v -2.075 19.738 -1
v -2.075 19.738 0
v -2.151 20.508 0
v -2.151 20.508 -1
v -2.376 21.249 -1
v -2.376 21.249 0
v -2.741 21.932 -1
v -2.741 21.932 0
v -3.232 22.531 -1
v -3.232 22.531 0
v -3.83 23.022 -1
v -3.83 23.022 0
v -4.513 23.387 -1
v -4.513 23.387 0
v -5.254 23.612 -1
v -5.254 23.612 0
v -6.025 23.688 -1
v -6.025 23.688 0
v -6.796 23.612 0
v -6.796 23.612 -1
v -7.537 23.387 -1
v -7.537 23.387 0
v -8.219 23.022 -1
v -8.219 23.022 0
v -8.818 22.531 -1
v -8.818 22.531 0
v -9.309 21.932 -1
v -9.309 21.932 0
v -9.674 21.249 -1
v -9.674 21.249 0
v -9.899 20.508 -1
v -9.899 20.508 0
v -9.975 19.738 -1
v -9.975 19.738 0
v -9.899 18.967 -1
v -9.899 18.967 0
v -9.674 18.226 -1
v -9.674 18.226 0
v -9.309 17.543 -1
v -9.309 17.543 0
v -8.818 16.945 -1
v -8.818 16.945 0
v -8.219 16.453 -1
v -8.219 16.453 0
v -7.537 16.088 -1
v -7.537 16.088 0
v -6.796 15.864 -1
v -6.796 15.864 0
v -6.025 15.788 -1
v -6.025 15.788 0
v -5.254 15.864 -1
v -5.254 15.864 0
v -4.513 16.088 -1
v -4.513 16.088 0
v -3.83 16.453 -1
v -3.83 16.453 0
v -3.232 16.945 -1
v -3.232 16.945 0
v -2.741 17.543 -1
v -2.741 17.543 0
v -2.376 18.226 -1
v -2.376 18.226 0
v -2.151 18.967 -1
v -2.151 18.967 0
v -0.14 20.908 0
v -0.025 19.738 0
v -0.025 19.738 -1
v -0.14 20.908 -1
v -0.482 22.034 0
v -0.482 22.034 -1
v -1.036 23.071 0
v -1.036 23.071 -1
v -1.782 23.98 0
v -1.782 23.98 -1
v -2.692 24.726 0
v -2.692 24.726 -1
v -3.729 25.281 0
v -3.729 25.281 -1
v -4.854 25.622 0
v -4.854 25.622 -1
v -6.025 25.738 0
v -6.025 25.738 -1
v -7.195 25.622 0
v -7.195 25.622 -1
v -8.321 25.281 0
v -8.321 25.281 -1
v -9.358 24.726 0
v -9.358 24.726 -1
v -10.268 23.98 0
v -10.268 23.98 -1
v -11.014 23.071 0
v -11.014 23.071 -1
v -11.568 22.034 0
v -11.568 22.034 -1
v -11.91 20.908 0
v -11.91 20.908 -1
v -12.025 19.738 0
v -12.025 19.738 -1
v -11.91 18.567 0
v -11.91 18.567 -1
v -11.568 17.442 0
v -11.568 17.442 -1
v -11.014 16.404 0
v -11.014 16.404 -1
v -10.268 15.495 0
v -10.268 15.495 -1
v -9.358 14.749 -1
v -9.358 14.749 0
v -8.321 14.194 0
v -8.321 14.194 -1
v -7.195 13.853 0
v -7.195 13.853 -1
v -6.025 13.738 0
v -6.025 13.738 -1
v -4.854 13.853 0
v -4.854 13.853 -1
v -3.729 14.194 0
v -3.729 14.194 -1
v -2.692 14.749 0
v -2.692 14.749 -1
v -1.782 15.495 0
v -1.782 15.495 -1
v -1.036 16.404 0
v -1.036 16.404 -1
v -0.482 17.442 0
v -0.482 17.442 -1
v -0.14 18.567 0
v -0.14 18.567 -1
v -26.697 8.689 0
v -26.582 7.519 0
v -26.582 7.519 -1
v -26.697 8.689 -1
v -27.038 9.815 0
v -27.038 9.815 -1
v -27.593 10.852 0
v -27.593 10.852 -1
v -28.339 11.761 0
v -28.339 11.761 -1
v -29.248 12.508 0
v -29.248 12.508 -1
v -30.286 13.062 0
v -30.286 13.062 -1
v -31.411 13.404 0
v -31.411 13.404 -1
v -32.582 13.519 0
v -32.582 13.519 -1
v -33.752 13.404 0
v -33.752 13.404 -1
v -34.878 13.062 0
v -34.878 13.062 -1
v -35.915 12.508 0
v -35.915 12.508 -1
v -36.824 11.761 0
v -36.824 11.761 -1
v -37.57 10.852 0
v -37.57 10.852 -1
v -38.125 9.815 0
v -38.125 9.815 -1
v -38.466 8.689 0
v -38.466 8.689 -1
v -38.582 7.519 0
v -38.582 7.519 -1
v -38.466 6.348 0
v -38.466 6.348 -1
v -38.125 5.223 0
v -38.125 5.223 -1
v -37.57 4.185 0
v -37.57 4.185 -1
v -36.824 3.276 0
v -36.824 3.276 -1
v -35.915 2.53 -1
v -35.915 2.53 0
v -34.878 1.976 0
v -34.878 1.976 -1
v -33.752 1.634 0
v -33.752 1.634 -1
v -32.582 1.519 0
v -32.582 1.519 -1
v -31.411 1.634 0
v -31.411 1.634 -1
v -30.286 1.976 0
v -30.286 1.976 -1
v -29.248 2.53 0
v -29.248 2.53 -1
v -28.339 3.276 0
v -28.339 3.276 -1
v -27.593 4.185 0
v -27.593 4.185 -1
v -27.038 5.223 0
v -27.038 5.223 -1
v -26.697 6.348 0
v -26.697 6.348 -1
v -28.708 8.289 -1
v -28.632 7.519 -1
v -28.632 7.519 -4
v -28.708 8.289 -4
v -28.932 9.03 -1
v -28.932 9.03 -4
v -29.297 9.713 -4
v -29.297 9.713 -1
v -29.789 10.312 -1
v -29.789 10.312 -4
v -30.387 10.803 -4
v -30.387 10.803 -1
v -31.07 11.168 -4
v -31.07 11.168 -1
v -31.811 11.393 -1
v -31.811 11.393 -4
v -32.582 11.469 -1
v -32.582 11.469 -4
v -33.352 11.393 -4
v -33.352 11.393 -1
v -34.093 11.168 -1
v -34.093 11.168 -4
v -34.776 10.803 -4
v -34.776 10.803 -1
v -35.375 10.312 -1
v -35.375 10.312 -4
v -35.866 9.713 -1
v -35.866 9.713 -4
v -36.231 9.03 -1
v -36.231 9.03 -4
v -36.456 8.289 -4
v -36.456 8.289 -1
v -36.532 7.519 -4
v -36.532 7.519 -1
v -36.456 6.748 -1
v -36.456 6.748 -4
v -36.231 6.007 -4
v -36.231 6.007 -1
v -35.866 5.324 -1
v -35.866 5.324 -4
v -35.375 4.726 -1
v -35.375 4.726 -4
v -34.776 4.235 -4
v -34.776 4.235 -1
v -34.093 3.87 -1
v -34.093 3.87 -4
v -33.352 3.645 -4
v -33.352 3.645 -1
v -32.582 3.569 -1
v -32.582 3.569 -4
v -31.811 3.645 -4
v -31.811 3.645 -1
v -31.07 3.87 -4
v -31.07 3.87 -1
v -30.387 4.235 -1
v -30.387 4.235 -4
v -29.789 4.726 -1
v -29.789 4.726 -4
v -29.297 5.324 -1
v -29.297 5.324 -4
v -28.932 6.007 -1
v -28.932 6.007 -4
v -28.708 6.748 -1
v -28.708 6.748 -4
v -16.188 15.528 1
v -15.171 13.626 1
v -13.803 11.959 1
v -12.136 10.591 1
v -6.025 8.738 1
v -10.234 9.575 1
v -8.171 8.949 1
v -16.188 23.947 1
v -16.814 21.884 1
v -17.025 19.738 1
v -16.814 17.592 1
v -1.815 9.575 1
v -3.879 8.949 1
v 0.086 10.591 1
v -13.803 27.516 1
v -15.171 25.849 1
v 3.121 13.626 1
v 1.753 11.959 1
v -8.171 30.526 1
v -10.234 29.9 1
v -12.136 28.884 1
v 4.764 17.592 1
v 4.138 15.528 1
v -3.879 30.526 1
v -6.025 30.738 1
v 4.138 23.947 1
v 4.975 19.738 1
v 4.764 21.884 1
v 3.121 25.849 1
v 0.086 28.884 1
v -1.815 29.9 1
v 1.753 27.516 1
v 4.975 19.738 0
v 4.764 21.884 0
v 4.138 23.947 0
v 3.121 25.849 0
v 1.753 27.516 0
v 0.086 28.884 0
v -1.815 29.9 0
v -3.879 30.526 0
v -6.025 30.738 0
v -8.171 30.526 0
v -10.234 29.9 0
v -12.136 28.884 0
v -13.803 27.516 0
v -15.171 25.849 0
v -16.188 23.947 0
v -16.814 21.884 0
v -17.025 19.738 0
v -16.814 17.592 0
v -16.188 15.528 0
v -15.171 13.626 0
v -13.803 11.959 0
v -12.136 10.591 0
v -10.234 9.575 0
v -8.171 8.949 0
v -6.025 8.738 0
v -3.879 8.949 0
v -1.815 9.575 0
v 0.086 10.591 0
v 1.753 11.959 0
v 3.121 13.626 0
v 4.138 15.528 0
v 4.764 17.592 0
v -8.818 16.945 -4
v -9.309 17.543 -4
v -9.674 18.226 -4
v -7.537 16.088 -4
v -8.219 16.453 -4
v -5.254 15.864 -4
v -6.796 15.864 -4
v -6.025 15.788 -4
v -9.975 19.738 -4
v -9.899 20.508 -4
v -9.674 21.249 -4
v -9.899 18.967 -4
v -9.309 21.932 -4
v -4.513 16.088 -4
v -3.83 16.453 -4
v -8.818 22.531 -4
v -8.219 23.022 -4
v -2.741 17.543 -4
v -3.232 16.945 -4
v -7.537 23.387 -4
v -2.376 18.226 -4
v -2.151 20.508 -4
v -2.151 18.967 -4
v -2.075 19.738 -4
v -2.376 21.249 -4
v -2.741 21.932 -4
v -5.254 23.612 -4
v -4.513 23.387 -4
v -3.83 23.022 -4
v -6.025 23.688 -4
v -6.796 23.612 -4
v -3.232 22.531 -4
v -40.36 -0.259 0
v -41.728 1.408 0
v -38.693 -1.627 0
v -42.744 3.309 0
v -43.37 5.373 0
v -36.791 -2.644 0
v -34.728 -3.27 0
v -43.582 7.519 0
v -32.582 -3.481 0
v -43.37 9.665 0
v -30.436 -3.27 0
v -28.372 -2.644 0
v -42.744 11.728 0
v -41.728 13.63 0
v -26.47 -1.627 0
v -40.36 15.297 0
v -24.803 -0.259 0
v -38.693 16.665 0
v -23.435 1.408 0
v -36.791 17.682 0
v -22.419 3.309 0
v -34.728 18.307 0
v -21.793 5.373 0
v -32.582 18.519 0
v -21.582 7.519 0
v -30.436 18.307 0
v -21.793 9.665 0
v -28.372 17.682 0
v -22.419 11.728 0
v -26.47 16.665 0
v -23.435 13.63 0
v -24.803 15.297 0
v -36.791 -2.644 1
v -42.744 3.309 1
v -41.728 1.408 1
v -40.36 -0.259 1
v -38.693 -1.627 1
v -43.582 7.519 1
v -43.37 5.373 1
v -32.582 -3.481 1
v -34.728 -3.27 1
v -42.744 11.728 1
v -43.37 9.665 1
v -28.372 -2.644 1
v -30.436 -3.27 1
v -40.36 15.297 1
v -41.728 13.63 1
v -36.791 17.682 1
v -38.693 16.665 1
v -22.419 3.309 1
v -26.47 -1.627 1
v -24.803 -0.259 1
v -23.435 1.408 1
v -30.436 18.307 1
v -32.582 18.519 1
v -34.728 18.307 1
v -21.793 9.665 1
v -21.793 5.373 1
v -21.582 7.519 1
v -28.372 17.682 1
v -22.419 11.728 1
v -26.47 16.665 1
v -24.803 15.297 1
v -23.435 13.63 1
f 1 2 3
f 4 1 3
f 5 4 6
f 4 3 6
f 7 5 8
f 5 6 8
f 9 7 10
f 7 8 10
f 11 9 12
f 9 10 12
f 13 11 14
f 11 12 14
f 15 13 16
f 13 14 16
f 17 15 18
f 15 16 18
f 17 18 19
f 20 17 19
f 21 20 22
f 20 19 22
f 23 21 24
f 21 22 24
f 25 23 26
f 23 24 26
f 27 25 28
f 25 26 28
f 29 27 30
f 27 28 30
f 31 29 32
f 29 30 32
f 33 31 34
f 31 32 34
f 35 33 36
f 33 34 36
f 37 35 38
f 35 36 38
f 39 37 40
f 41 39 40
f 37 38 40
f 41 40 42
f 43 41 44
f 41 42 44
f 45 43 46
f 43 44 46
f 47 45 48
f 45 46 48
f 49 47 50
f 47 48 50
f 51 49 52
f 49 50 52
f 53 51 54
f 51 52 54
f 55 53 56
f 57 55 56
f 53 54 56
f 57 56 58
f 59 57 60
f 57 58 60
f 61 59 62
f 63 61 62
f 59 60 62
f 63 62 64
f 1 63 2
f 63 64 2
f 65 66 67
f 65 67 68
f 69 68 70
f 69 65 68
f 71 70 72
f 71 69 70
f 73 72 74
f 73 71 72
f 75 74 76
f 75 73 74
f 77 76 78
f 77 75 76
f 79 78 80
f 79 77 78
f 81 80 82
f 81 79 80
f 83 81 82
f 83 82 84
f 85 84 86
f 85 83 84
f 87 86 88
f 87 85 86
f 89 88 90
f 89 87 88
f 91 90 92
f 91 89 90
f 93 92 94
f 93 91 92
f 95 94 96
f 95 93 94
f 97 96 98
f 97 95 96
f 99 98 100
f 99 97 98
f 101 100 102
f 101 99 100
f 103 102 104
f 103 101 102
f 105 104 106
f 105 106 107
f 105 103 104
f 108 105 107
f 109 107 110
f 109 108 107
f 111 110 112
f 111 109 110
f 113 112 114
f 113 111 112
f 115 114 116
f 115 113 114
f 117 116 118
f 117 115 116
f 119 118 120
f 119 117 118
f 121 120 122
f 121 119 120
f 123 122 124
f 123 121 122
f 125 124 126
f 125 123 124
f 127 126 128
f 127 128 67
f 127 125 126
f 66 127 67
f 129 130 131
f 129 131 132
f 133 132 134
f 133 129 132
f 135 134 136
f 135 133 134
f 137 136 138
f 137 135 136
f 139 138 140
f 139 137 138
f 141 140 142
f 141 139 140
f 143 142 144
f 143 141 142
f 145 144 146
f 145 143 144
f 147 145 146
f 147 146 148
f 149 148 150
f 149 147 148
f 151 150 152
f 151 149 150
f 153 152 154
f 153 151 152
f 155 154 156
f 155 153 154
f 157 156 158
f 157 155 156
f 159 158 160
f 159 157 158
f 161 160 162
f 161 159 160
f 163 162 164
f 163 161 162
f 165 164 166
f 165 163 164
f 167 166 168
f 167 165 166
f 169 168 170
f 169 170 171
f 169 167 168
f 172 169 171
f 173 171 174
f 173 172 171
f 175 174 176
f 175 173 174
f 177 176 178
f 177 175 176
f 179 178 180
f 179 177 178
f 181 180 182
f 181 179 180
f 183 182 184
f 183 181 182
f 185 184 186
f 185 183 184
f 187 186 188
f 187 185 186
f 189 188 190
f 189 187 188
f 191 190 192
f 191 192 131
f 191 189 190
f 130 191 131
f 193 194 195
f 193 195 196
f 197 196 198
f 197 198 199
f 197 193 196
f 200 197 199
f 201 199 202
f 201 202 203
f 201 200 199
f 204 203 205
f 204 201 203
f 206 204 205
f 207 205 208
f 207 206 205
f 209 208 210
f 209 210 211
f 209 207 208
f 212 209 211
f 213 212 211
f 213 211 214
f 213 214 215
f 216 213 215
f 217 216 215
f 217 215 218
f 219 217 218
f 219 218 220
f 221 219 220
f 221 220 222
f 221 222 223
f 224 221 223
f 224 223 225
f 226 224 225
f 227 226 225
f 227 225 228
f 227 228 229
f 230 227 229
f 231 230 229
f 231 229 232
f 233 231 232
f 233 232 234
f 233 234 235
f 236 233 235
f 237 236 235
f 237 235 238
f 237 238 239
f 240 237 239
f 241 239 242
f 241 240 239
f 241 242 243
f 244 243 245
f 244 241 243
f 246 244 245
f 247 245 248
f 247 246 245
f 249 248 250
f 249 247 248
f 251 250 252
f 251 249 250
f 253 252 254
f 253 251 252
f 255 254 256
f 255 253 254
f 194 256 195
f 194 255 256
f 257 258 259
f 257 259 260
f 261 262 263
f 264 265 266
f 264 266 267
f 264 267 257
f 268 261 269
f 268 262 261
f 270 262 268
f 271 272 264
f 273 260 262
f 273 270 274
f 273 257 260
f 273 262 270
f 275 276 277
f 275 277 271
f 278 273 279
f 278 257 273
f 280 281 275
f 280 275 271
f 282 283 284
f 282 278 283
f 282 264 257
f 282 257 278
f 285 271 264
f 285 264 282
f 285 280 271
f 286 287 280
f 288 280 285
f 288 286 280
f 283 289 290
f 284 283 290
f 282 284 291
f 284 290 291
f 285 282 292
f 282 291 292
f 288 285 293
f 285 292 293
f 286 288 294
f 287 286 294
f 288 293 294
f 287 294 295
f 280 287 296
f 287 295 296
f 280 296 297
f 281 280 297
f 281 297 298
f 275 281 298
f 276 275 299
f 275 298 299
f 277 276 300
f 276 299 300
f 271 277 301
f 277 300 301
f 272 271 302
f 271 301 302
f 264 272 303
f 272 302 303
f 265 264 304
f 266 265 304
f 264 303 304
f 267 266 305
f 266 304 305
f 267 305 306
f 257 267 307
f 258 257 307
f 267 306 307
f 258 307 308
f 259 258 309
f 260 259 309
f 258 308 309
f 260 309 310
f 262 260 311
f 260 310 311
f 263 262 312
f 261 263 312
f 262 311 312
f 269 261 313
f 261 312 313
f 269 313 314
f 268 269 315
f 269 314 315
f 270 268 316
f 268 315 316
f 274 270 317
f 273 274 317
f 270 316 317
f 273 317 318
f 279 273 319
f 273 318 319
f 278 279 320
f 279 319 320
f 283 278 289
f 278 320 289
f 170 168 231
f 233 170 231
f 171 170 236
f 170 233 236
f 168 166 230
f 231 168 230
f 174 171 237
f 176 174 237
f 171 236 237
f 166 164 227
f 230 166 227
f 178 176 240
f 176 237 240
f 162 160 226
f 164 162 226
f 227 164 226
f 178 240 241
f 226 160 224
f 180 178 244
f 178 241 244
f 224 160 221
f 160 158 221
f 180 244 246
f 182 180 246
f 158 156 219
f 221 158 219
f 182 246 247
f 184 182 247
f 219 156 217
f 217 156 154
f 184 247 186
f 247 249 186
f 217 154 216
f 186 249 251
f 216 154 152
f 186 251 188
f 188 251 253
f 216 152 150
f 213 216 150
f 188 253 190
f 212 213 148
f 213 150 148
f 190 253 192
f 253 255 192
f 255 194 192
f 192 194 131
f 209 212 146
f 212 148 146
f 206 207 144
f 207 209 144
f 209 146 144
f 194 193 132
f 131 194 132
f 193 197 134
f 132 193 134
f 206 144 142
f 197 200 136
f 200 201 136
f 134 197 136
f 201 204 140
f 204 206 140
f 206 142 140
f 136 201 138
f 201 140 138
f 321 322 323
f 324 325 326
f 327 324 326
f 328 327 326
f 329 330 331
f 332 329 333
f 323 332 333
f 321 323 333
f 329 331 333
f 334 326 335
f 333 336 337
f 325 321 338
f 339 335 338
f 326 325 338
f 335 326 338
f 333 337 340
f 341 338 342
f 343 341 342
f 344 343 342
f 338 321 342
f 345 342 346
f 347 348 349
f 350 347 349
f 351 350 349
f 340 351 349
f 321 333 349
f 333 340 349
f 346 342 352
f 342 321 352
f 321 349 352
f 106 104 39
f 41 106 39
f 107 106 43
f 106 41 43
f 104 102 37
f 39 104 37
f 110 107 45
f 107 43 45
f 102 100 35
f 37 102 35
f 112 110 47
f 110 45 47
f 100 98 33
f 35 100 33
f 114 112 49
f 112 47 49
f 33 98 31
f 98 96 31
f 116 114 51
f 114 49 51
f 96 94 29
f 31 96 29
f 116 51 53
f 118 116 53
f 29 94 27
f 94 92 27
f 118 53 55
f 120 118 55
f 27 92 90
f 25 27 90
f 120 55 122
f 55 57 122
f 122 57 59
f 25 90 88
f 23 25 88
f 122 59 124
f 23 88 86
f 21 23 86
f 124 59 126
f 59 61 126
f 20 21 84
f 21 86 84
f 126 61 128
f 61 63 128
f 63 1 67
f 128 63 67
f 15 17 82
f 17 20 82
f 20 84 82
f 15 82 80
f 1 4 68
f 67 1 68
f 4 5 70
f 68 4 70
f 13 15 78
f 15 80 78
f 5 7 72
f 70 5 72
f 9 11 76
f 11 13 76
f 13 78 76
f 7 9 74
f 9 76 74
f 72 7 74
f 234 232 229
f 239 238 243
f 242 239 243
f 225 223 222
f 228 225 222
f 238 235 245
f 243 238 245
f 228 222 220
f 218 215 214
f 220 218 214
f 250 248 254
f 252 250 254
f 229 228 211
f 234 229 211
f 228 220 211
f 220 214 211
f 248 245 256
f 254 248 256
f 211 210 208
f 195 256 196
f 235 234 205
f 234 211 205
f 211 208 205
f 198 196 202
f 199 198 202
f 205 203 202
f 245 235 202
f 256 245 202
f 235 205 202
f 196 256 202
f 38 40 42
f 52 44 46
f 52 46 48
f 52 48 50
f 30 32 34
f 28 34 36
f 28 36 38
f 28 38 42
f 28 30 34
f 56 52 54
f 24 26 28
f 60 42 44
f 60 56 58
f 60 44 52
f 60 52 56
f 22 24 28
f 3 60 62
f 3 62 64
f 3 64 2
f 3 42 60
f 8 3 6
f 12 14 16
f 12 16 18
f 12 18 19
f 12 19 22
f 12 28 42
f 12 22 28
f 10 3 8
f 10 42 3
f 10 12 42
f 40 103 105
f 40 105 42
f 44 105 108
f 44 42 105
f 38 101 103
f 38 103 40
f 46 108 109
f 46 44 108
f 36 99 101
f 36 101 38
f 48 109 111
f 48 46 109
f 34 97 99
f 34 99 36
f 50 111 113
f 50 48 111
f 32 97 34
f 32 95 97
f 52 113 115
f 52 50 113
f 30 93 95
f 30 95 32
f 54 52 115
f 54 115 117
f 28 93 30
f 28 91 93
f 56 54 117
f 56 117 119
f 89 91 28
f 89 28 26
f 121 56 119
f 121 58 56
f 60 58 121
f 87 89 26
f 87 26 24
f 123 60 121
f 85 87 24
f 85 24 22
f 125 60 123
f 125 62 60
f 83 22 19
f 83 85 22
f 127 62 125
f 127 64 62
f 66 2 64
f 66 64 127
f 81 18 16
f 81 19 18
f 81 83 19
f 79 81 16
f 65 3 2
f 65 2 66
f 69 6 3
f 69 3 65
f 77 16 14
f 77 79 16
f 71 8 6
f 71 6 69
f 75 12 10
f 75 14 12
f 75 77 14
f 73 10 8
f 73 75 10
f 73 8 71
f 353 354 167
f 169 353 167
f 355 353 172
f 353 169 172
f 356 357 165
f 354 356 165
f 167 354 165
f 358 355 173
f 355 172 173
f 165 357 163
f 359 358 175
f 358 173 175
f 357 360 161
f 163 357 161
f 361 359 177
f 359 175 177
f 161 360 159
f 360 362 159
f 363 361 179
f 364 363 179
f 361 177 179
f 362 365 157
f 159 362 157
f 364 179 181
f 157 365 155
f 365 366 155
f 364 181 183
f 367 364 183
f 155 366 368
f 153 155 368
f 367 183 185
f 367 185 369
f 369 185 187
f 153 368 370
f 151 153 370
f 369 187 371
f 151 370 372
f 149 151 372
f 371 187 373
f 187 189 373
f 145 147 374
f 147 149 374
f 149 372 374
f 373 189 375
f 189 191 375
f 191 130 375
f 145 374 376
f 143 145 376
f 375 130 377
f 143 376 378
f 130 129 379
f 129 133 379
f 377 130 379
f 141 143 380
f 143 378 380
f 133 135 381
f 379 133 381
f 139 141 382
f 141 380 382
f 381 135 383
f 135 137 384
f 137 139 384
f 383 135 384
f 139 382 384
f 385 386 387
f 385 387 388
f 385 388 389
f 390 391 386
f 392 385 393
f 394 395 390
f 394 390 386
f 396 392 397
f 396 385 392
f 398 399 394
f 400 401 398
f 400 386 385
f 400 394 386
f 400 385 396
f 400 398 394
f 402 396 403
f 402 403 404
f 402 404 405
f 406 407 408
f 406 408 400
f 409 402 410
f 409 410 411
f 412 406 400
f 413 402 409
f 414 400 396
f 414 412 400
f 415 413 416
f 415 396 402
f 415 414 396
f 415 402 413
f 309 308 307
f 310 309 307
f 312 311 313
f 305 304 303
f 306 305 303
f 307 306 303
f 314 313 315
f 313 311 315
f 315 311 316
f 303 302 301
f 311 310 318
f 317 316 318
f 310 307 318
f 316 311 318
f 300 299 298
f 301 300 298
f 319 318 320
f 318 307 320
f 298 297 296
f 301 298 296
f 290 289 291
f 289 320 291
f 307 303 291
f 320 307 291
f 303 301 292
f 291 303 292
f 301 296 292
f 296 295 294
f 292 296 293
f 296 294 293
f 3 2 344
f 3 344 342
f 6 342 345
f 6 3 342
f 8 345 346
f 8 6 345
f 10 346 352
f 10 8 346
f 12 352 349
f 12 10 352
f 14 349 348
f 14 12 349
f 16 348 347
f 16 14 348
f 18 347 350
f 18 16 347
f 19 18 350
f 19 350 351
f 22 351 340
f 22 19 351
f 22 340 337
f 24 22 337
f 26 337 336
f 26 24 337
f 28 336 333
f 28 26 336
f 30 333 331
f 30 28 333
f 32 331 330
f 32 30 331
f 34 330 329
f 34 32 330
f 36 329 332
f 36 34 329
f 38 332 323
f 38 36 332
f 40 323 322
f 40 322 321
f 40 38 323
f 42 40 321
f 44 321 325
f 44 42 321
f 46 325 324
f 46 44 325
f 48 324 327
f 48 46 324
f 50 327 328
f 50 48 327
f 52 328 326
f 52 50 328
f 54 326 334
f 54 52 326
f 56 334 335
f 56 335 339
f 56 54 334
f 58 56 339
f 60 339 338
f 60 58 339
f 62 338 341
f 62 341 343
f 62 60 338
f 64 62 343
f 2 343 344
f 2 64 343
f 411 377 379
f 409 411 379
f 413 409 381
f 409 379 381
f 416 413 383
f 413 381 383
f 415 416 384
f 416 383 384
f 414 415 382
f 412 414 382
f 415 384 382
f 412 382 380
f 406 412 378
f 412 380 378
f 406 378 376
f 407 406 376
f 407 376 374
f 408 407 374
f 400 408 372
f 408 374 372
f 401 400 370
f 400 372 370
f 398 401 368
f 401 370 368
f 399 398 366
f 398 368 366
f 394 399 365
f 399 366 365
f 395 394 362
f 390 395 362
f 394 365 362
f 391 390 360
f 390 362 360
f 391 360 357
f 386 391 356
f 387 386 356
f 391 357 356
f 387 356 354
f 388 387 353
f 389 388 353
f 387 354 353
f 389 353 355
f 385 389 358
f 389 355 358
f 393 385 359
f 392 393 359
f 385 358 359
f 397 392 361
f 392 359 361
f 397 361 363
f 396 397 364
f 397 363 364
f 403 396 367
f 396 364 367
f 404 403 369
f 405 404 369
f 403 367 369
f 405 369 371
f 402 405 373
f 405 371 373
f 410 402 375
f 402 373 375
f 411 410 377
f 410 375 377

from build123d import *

# Parameters (mm, degrees)
F0_R     = 11
F0_R_2   = 6
F0_R_3   = 3.95
F1_DEPTH = 1
F2_DEPTH = 4
F3_DEPTH = 1


with BuildPart() as f1:
    # F0 (on Top) → F1 (new body)
    with BuildSketch(Plane.XY):
        with Locations((-32.5816608965, 7.518844679)):
            Circle(F0_R)
        with Locations((-32.5816608965, 7.518844679)):
            Circle(F0_R_2, mode=Mode.SUBTRACT)
        with Locations((-32.5816608965, 7.518844679)):
            Circle(F0_R_2)
        with Locations((-32.5816608965, 7.518844679)):
            Circle(F0_R_3, mode=Mode.SUBTRACT)
        with Locations((-32.5816608965, 7.518844679)):
            Circle(F0_R_3)
    extrude(amount=F1_DEPTH)

    # F0 (on Top) → F2 (join)
    with BuildSketch(Plane.XY):
        with Locations((-32.5816608965, 7.518844679)):
            Circle(F0_R_3)
    extrude(amount=-F2_DEPTH)

    # F0 (on Top) → F3 (join)
    with BuildSketch(Plane.XY):
        with Locations((-32.5816608965, 7.518844679)):
            Circle(F0_R_2)
        with Locations((-32.5816608965, 7.518844679)):
            Circle(F0_R_3, mode=Mode.SUBTRACT)
    extrude(amount=-F3_DEPTH)


with BuildPart() as f1b:
    # F0 (on Top) → F1, piece 2 (new body)
    with BuildSketch(Plane.XY):
        with Locations((-6.0249380767, 19.7376422584)):
            Circle(F0_R)
        with Locations((-6.0249380767, 19.7376422584)):
            Circle(F0_R_2, mode=Mode.SUBTRACT)
        with Locations((-6.0249380767, 19.7376422584)):
            Circle(F0_R_2)
        with Locations((-6.0249380767, 19.7376422584)):
            Circle(F0_R_3, mode=Mode.SUBTRACT)
        with Locations((-6.0249380767, 19.7376422584)):
            Circle(F0_R_3)
    extrude(amount=F1_DEPTH)


with BuildPart() as f2:
    # F0 (on Top) → F2, piece 2 (new body)
    with BuildSketch(Plane.XY):
        with Locations((-6.0249380767, 19.7376422584)):
            Circle(F0_R_3)
    extrude(amount=-F2_DEPTH)


with BuildPart() as f3:
    # F0 (on Top) → F3, piece 2 (new body)
    with BuildSketch(Plane.XY):
        with Locations((-6.0249380767, 19.7376422584)):
            Circle(F0_R_2)
        with Locations((-6.0249380767, 19.7376422584)):
            Circle(F0_R_3, mode=Mode.SUBTRACT)
    extrude(amount=-F3_DEPTH)


solid = Compound([f1.part, f1b.part, f2.part, f3.part])
